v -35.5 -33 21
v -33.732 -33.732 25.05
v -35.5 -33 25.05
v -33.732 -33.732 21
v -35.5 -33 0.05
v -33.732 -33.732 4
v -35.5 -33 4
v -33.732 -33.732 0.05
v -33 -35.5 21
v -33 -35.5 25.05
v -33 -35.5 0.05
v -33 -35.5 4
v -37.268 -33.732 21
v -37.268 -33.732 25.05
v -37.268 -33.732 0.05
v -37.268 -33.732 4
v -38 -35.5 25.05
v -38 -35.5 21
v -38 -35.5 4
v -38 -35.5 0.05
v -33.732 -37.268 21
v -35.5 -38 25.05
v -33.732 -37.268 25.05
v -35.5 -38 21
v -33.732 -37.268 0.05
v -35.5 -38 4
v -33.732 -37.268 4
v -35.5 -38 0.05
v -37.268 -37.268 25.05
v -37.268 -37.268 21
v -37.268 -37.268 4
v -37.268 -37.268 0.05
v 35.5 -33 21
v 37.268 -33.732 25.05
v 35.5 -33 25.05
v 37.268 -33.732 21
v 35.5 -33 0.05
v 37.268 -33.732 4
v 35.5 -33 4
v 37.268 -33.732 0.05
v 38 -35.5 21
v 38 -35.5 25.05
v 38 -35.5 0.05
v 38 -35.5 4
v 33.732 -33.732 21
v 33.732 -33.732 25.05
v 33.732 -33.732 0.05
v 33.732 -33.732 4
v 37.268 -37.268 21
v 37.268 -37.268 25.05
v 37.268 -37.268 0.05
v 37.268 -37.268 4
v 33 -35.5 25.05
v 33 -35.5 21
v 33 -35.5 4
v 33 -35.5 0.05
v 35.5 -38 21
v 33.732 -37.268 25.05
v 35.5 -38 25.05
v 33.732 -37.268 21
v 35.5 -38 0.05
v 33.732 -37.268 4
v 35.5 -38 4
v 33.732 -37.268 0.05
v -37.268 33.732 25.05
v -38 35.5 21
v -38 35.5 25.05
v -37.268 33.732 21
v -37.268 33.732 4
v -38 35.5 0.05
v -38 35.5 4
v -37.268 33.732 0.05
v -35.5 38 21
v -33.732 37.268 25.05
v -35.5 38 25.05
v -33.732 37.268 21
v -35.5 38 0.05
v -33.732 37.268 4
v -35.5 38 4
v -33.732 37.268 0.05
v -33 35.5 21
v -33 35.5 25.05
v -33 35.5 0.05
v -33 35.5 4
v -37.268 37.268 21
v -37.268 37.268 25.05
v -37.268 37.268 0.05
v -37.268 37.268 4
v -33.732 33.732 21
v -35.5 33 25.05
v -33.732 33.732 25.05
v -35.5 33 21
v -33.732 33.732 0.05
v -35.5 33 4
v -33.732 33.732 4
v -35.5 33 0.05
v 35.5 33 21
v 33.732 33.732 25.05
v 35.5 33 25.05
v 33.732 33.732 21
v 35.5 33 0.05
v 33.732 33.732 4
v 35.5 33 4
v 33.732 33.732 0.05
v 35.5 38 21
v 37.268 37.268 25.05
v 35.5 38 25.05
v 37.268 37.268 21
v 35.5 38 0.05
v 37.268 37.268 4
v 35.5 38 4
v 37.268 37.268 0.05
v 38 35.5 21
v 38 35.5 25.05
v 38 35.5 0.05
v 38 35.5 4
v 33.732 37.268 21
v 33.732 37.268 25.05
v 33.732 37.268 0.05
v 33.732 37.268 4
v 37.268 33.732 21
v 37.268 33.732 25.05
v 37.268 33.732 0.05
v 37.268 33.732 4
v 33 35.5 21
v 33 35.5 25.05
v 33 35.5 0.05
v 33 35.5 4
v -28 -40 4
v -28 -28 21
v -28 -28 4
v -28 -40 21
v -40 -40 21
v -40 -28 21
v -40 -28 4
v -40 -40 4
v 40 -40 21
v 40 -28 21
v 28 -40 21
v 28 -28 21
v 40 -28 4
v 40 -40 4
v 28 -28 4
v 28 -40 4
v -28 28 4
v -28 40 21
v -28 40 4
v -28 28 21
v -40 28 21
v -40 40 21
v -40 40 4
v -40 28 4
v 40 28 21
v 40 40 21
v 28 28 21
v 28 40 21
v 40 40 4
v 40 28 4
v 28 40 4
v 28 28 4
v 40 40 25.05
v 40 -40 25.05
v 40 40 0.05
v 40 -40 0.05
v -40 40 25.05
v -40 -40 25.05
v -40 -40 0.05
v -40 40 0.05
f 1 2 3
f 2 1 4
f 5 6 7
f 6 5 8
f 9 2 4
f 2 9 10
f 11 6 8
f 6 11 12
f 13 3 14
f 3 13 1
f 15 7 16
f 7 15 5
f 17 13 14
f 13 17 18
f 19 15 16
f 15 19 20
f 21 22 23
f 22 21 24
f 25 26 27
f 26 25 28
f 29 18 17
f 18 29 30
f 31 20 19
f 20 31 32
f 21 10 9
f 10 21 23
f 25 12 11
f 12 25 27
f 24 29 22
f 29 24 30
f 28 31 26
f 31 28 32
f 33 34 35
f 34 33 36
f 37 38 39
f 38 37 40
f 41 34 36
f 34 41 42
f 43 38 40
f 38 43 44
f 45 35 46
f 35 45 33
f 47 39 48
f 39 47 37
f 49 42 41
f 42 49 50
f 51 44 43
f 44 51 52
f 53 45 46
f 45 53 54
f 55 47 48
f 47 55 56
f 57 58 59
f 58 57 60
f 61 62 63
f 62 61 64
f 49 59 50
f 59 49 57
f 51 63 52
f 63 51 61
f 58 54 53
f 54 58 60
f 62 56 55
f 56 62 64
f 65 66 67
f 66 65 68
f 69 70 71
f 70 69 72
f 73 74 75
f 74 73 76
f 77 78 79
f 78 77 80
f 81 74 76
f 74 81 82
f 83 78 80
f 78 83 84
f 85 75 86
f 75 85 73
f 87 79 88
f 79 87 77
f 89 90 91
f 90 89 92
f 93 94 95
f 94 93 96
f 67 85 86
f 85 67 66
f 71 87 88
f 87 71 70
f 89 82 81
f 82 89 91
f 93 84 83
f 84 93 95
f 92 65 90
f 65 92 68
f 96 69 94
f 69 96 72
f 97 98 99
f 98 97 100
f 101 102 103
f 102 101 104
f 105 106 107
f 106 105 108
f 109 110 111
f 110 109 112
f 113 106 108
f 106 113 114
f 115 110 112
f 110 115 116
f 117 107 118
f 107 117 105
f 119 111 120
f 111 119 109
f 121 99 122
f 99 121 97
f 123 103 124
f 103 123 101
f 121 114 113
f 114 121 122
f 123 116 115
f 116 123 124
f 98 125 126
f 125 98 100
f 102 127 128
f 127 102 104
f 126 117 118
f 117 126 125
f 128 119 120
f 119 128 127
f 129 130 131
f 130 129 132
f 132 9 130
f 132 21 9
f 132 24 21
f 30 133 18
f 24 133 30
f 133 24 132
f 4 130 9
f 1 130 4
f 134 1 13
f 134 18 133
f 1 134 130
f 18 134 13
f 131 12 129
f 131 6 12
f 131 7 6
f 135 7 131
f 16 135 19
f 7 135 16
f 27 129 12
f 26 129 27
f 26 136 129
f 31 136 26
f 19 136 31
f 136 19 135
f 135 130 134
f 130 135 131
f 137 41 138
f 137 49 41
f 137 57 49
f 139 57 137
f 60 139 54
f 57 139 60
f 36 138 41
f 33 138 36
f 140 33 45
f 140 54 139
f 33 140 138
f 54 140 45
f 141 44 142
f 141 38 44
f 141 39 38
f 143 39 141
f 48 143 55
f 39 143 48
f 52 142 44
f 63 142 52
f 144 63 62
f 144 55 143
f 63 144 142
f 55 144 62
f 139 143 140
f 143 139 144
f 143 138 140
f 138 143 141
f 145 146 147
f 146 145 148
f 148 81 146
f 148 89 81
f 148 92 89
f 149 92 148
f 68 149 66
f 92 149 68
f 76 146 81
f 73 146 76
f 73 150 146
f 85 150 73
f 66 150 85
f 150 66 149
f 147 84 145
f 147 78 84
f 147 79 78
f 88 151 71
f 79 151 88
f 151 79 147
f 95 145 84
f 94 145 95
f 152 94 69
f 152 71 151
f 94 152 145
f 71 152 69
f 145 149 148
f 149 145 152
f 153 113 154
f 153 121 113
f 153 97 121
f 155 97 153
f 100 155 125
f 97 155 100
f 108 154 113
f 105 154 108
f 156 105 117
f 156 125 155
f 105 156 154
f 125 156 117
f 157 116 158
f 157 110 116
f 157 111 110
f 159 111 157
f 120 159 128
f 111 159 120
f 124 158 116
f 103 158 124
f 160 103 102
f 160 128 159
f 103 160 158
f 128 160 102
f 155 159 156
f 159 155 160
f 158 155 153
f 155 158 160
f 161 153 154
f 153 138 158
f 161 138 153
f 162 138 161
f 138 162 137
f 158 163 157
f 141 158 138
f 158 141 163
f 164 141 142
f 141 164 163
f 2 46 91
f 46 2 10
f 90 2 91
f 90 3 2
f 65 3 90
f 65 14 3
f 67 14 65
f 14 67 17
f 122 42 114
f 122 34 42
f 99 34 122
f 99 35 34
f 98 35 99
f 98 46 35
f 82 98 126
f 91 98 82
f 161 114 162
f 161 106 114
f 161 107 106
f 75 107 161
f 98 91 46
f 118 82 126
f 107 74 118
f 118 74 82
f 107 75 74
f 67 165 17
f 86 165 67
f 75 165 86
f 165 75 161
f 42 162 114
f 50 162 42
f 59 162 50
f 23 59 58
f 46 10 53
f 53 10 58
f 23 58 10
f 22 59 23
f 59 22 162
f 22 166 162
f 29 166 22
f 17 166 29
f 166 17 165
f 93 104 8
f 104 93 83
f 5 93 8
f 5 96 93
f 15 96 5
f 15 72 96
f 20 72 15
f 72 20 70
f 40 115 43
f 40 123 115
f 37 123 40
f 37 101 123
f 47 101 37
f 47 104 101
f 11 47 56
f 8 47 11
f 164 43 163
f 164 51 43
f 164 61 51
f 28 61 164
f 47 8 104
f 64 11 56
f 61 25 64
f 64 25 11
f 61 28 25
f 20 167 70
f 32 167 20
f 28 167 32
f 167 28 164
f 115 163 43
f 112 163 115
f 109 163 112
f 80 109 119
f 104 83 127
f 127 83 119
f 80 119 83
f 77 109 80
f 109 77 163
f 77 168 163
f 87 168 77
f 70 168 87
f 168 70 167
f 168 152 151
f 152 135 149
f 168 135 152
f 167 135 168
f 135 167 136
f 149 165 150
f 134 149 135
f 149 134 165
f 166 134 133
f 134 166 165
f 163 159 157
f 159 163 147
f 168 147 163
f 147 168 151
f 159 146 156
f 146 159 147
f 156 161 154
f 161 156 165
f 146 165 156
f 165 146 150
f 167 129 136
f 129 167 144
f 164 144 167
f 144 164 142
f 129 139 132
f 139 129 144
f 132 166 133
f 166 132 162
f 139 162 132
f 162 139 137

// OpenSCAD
// -*-C-*-
// Module for metric nuts and bolts.
//
// NOTE: the various _socket() objects are designed to be
// used with the difference() function to carve out sockets
// in other objects.
//
// Copyright 2013, Brian Davis
//
// License: LGPL 2.1 or later

// FIXME: rough model, contains no cutout for blades.
module 80_mm_12_volt_cooling_fan() {
  difference() {
    translate([0, 0, 12.55])
      cube([80, 80, 25], center=true);
    union() {
      // Holes for mounting screws.
      for (y_mult = [-1 : 2 : 1]) {
        for (x_mult = [-1 : 2 : 1]) {
          translate([x_mult * 35.5, y_mult * 35.5, 12.45])
            cylinder(r=2.5, h=25.5, center=true);
        }
      }
      // Corner cutouts.
      // FIXME: not exactly correct, but close enough.
      for (y_mult = [-1 : 2 : 1]) {
        for (x_mult = [-1 : 2 : 1]) {
          translate([x_mult * 35.5, y_mult * 35.5, 12.5])
            cube([15, 15, 17], center=true);
        }
      }
    }
  }
}

80_mm_12_volt_cooling_fan();
